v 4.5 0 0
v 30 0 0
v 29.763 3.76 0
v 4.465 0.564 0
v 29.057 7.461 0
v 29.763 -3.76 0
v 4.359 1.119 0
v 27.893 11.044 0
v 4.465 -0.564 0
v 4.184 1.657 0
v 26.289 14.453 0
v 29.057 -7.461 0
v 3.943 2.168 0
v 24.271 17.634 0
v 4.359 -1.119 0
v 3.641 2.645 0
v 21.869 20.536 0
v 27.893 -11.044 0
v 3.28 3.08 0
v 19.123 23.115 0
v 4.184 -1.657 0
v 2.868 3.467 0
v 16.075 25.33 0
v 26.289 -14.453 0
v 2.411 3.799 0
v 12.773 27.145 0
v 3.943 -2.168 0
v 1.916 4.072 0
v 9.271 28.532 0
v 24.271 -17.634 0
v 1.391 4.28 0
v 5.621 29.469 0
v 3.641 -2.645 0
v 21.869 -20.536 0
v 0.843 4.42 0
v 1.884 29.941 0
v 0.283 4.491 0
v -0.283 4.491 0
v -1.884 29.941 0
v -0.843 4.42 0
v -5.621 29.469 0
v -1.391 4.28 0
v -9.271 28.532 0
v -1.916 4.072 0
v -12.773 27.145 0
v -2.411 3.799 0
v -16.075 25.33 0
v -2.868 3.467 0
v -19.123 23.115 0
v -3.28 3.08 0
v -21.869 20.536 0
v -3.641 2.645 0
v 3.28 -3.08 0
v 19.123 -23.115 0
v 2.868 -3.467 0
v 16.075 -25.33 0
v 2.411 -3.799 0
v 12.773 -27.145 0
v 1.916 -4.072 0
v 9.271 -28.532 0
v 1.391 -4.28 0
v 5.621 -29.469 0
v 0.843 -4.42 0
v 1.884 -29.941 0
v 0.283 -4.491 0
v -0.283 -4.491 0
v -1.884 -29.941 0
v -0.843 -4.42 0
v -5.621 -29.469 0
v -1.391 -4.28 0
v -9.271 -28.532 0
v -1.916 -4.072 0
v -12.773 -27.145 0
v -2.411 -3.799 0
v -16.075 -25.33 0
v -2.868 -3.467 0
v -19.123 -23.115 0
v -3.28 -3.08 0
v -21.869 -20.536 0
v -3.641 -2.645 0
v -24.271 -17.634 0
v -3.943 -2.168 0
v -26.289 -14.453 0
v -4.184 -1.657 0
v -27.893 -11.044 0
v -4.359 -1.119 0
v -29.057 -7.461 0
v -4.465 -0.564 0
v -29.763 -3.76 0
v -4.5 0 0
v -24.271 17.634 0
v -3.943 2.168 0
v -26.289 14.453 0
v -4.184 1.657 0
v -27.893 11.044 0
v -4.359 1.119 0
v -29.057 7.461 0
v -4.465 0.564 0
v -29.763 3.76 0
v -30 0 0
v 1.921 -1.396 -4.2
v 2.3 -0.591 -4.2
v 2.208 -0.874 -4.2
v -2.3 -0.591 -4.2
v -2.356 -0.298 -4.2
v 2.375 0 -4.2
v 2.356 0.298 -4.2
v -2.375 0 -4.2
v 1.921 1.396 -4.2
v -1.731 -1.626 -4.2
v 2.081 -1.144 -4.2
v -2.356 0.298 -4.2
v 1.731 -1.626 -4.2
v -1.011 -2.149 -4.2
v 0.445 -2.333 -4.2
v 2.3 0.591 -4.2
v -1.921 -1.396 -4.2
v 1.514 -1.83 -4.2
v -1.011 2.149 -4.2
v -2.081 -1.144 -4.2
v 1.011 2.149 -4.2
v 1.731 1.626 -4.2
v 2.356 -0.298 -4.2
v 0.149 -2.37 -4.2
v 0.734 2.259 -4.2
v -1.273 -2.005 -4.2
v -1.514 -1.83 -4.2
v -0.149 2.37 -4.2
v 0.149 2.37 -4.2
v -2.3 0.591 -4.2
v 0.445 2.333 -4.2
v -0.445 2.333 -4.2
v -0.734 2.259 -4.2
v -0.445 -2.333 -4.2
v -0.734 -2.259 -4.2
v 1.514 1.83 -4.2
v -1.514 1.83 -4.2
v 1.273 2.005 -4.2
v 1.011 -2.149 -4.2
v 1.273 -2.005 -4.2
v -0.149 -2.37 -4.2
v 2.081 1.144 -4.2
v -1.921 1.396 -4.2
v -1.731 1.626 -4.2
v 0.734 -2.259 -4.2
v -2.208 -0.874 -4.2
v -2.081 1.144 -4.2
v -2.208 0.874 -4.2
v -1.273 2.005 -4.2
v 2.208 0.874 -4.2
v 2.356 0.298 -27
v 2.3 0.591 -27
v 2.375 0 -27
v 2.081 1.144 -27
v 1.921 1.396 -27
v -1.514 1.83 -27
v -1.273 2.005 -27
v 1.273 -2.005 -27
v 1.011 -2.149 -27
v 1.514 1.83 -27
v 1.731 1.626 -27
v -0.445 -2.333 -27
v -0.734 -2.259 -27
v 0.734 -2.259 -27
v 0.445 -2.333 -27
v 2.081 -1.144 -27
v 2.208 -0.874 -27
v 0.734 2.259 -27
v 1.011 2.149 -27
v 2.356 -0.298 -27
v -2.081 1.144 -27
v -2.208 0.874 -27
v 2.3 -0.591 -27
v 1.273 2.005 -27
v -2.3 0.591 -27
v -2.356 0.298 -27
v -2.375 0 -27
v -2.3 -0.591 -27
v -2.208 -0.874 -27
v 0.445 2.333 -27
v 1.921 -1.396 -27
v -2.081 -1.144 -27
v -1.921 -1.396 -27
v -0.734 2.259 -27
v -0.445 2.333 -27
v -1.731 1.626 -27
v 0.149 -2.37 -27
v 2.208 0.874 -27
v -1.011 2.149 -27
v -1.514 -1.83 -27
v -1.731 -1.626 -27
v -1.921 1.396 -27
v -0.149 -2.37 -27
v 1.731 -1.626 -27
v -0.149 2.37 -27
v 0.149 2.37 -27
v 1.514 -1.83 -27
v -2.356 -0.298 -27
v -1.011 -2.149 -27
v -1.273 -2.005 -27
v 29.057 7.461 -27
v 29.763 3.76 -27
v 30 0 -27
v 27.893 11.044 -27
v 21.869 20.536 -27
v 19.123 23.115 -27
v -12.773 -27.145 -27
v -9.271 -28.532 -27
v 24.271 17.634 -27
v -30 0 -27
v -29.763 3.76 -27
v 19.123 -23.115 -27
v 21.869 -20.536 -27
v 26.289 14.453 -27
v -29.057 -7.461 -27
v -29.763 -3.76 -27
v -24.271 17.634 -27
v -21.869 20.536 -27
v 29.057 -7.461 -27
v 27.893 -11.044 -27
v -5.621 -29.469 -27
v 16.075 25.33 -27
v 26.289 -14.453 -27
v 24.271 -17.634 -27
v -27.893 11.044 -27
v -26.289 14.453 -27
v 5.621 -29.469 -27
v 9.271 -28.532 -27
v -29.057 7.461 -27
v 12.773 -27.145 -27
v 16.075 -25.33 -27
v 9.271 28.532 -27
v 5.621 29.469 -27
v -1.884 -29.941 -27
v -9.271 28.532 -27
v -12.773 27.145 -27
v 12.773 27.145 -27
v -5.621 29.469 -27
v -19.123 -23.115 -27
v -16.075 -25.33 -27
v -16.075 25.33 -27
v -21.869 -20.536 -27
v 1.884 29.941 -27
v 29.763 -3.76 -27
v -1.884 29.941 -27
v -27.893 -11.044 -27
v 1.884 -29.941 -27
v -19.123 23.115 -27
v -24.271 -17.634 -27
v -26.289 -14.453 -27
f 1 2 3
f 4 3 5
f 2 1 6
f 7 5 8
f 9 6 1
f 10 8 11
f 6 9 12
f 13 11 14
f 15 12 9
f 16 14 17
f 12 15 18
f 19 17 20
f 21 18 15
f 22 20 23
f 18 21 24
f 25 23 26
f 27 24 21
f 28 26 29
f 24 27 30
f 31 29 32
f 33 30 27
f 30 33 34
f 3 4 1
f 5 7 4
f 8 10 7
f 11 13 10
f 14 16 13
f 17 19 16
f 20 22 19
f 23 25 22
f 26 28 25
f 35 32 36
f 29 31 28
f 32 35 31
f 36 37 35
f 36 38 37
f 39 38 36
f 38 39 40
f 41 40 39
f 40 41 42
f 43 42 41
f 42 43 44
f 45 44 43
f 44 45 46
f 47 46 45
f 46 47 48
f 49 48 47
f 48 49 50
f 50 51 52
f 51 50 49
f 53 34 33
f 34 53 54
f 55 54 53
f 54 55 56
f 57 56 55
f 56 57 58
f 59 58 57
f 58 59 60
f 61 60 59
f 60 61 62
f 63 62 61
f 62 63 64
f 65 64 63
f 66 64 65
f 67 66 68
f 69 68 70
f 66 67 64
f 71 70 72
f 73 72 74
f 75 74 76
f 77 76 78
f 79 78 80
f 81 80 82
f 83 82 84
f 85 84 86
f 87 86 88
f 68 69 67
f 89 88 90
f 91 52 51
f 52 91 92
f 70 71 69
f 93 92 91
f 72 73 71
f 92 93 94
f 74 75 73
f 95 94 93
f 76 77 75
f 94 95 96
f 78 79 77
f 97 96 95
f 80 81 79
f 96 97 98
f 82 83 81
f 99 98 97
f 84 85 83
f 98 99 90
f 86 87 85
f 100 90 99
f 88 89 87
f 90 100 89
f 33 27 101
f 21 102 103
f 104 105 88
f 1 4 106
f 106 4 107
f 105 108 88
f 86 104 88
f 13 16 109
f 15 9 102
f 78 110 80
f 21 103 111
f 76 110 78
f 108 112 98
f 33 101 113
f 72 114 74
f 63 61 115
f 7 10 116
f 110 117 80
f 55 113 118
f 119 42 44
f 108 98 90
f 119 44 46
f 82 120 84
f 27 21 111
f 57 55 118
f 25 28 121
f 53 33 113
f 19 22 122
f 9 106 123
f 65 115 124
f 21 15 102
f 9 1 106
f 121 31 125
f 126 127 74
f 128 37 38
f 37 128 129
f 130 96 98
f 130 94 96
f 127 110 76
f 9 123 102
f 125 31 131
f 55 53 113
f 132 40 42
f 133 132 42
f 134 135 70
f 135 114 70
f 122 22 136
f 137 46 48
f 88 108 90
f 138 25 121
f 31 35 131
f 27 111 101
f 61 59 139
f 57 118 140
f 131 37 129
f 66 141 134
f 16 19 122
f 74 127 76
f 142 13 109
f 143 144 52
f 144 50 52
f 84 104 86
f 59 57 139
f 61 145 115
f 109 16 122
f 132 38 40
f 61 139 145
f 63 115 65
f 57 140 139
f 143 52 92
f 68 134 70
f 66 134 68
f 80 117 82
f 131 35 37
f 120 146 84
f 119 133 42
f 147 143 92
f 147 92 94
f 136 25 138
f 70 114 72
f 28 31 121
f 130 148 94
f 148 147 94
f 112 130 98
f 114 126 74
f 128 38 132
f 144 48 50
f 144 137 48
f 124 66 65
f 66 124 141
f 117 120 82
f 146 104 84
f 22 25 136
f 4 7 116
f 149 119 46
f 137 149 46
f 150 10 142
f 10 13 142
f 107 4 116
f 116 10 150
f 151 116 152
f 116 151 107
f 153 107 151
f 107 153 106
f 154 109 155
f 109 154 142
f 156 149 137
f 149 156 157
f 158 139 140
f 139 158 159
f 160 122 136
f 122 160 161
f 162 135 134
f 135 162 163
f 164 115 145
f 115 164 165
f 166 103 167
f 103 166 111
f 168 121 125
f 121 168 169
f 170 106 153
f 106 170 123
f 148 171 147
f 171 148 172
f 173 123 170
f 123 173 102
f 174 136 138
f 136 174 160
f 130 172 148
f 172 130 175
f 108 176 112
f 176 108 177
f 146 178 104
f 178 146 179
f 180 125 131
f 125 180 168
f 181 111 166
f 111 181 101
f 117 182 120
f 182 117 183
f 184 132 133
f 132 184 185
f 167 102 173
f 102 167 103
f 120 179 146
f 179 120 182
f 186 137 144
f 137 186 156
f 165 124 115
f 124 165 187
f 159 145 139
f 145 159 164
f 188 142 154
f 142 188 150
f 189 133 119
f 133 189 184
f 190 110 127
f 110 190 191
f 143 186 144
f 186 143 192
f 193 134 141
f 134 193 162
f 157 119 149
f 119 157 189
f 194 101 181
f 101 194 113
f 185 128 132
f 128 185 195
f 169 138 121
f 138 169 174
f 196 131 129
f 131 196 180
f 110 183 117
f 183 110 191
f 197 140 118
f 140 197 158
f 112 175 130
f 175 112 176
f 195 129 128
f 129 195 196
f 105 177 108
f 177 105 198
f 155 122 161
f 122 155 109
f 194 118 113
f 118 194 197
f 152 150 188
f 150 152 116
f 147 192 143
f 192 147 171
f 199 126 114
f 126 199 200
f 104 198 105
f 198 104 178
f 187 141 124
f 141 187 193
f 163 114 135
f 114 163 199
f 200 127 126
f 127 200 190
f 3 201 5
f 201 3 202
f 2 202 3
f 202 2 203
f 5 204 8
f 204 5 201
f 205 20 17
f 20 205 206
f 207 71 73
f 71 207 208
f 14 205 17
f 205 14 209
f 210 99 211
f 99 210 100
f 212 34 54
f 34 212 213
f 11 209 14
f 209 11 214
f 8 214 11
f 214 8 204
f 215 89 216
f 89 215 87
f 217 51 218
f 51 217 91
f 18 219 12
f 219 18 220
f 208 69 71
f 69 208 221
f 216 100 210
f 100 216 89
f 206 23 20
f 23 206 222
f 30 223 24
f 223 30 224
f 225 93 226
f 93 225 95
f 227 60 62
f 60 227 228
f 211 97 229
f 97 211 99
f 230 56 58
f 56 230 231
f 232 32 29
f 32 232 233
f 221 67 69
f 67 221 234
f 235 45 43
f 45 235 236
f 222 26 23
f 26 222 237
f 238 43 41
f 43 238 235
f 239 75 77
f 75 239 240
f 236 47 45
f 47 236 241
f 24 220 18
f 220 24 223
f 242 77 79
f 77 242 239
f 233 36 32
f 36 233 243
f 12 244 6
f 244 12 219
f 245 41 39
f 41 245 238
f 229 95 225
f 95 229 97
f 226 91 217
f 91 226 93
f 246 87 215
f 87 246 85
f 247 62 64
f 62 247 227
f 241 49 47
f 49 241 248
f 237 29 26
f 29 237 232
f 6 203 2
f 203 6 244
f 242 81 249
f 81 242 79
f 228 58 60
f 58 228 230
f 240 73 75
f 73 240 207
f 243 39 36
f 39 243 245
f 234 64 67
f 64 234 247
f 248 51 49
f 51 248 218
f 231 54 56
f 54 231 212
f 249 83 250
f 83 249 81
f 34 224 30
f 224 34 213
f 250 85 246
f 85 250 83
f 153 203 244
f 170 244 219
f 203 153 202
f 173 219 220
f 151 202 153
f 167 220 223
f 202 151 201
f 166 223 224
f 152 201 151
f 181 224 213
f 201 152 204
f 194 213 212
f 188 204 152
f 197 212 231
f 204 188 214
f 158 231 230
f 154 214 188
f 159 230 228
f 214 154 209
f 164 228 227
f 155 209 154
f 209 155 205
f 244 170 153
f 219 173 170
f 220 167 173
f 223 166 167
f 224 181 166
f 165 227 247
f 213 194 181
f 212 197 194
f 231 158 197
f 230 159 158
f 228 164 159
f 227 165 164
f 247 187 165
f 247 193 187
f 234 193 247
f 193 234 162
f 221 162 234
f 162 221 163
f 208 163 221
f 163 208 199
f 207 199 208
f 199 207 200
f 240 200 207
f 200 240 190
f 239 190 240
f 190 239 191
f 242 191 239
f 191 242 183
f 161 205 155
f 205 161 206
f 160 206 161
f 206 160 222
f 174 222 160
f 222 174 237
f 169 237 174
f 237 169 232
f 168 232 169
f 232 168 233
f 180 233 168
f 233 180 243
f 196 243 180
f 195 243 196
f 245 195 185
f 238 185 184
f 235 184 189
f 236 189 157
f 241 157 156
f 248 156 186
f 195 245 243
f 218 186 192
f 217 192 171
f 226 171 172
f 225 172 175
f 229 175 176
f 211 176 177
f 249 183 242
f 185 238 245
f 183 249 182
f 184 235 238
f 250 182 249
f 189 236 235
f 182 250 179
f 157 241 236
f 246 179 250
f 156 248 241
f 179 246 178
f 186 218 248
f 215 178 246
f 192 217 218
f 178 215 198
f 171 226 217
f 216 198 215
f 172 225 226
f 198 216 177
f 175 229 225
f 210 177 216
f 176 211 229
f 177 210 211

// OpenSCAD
$fn = 50;

difference() {
	union() {
		translate(v = [0, 0, -27.0]) {
			cylinder(h = 27, r = 30.0);
		}
	}
	union() {
		translate(v = [0, 0, 0]) {
			rotate(a = [0, 0, 0]) {
				difference() {
					union() {
						translate(v = [0, 0, -30.0]) {
							cylinder(h = 30, r = 2.25);
						}
						translate(v = [0, 0, -4.2]) {
							cylinder(h = 4.2, r1 = 2.375, r2 = 4.5);
						}
						translate(v = [0, 0, -30.0]) {
							cylinder(h = 30, r = 2.375);
						}
						translate(v = [0, 0, -30.0]) {
							cylinder(h = 30, r = 2.25);
						}
					}
					union();
				}
			}
		}
	}
}
